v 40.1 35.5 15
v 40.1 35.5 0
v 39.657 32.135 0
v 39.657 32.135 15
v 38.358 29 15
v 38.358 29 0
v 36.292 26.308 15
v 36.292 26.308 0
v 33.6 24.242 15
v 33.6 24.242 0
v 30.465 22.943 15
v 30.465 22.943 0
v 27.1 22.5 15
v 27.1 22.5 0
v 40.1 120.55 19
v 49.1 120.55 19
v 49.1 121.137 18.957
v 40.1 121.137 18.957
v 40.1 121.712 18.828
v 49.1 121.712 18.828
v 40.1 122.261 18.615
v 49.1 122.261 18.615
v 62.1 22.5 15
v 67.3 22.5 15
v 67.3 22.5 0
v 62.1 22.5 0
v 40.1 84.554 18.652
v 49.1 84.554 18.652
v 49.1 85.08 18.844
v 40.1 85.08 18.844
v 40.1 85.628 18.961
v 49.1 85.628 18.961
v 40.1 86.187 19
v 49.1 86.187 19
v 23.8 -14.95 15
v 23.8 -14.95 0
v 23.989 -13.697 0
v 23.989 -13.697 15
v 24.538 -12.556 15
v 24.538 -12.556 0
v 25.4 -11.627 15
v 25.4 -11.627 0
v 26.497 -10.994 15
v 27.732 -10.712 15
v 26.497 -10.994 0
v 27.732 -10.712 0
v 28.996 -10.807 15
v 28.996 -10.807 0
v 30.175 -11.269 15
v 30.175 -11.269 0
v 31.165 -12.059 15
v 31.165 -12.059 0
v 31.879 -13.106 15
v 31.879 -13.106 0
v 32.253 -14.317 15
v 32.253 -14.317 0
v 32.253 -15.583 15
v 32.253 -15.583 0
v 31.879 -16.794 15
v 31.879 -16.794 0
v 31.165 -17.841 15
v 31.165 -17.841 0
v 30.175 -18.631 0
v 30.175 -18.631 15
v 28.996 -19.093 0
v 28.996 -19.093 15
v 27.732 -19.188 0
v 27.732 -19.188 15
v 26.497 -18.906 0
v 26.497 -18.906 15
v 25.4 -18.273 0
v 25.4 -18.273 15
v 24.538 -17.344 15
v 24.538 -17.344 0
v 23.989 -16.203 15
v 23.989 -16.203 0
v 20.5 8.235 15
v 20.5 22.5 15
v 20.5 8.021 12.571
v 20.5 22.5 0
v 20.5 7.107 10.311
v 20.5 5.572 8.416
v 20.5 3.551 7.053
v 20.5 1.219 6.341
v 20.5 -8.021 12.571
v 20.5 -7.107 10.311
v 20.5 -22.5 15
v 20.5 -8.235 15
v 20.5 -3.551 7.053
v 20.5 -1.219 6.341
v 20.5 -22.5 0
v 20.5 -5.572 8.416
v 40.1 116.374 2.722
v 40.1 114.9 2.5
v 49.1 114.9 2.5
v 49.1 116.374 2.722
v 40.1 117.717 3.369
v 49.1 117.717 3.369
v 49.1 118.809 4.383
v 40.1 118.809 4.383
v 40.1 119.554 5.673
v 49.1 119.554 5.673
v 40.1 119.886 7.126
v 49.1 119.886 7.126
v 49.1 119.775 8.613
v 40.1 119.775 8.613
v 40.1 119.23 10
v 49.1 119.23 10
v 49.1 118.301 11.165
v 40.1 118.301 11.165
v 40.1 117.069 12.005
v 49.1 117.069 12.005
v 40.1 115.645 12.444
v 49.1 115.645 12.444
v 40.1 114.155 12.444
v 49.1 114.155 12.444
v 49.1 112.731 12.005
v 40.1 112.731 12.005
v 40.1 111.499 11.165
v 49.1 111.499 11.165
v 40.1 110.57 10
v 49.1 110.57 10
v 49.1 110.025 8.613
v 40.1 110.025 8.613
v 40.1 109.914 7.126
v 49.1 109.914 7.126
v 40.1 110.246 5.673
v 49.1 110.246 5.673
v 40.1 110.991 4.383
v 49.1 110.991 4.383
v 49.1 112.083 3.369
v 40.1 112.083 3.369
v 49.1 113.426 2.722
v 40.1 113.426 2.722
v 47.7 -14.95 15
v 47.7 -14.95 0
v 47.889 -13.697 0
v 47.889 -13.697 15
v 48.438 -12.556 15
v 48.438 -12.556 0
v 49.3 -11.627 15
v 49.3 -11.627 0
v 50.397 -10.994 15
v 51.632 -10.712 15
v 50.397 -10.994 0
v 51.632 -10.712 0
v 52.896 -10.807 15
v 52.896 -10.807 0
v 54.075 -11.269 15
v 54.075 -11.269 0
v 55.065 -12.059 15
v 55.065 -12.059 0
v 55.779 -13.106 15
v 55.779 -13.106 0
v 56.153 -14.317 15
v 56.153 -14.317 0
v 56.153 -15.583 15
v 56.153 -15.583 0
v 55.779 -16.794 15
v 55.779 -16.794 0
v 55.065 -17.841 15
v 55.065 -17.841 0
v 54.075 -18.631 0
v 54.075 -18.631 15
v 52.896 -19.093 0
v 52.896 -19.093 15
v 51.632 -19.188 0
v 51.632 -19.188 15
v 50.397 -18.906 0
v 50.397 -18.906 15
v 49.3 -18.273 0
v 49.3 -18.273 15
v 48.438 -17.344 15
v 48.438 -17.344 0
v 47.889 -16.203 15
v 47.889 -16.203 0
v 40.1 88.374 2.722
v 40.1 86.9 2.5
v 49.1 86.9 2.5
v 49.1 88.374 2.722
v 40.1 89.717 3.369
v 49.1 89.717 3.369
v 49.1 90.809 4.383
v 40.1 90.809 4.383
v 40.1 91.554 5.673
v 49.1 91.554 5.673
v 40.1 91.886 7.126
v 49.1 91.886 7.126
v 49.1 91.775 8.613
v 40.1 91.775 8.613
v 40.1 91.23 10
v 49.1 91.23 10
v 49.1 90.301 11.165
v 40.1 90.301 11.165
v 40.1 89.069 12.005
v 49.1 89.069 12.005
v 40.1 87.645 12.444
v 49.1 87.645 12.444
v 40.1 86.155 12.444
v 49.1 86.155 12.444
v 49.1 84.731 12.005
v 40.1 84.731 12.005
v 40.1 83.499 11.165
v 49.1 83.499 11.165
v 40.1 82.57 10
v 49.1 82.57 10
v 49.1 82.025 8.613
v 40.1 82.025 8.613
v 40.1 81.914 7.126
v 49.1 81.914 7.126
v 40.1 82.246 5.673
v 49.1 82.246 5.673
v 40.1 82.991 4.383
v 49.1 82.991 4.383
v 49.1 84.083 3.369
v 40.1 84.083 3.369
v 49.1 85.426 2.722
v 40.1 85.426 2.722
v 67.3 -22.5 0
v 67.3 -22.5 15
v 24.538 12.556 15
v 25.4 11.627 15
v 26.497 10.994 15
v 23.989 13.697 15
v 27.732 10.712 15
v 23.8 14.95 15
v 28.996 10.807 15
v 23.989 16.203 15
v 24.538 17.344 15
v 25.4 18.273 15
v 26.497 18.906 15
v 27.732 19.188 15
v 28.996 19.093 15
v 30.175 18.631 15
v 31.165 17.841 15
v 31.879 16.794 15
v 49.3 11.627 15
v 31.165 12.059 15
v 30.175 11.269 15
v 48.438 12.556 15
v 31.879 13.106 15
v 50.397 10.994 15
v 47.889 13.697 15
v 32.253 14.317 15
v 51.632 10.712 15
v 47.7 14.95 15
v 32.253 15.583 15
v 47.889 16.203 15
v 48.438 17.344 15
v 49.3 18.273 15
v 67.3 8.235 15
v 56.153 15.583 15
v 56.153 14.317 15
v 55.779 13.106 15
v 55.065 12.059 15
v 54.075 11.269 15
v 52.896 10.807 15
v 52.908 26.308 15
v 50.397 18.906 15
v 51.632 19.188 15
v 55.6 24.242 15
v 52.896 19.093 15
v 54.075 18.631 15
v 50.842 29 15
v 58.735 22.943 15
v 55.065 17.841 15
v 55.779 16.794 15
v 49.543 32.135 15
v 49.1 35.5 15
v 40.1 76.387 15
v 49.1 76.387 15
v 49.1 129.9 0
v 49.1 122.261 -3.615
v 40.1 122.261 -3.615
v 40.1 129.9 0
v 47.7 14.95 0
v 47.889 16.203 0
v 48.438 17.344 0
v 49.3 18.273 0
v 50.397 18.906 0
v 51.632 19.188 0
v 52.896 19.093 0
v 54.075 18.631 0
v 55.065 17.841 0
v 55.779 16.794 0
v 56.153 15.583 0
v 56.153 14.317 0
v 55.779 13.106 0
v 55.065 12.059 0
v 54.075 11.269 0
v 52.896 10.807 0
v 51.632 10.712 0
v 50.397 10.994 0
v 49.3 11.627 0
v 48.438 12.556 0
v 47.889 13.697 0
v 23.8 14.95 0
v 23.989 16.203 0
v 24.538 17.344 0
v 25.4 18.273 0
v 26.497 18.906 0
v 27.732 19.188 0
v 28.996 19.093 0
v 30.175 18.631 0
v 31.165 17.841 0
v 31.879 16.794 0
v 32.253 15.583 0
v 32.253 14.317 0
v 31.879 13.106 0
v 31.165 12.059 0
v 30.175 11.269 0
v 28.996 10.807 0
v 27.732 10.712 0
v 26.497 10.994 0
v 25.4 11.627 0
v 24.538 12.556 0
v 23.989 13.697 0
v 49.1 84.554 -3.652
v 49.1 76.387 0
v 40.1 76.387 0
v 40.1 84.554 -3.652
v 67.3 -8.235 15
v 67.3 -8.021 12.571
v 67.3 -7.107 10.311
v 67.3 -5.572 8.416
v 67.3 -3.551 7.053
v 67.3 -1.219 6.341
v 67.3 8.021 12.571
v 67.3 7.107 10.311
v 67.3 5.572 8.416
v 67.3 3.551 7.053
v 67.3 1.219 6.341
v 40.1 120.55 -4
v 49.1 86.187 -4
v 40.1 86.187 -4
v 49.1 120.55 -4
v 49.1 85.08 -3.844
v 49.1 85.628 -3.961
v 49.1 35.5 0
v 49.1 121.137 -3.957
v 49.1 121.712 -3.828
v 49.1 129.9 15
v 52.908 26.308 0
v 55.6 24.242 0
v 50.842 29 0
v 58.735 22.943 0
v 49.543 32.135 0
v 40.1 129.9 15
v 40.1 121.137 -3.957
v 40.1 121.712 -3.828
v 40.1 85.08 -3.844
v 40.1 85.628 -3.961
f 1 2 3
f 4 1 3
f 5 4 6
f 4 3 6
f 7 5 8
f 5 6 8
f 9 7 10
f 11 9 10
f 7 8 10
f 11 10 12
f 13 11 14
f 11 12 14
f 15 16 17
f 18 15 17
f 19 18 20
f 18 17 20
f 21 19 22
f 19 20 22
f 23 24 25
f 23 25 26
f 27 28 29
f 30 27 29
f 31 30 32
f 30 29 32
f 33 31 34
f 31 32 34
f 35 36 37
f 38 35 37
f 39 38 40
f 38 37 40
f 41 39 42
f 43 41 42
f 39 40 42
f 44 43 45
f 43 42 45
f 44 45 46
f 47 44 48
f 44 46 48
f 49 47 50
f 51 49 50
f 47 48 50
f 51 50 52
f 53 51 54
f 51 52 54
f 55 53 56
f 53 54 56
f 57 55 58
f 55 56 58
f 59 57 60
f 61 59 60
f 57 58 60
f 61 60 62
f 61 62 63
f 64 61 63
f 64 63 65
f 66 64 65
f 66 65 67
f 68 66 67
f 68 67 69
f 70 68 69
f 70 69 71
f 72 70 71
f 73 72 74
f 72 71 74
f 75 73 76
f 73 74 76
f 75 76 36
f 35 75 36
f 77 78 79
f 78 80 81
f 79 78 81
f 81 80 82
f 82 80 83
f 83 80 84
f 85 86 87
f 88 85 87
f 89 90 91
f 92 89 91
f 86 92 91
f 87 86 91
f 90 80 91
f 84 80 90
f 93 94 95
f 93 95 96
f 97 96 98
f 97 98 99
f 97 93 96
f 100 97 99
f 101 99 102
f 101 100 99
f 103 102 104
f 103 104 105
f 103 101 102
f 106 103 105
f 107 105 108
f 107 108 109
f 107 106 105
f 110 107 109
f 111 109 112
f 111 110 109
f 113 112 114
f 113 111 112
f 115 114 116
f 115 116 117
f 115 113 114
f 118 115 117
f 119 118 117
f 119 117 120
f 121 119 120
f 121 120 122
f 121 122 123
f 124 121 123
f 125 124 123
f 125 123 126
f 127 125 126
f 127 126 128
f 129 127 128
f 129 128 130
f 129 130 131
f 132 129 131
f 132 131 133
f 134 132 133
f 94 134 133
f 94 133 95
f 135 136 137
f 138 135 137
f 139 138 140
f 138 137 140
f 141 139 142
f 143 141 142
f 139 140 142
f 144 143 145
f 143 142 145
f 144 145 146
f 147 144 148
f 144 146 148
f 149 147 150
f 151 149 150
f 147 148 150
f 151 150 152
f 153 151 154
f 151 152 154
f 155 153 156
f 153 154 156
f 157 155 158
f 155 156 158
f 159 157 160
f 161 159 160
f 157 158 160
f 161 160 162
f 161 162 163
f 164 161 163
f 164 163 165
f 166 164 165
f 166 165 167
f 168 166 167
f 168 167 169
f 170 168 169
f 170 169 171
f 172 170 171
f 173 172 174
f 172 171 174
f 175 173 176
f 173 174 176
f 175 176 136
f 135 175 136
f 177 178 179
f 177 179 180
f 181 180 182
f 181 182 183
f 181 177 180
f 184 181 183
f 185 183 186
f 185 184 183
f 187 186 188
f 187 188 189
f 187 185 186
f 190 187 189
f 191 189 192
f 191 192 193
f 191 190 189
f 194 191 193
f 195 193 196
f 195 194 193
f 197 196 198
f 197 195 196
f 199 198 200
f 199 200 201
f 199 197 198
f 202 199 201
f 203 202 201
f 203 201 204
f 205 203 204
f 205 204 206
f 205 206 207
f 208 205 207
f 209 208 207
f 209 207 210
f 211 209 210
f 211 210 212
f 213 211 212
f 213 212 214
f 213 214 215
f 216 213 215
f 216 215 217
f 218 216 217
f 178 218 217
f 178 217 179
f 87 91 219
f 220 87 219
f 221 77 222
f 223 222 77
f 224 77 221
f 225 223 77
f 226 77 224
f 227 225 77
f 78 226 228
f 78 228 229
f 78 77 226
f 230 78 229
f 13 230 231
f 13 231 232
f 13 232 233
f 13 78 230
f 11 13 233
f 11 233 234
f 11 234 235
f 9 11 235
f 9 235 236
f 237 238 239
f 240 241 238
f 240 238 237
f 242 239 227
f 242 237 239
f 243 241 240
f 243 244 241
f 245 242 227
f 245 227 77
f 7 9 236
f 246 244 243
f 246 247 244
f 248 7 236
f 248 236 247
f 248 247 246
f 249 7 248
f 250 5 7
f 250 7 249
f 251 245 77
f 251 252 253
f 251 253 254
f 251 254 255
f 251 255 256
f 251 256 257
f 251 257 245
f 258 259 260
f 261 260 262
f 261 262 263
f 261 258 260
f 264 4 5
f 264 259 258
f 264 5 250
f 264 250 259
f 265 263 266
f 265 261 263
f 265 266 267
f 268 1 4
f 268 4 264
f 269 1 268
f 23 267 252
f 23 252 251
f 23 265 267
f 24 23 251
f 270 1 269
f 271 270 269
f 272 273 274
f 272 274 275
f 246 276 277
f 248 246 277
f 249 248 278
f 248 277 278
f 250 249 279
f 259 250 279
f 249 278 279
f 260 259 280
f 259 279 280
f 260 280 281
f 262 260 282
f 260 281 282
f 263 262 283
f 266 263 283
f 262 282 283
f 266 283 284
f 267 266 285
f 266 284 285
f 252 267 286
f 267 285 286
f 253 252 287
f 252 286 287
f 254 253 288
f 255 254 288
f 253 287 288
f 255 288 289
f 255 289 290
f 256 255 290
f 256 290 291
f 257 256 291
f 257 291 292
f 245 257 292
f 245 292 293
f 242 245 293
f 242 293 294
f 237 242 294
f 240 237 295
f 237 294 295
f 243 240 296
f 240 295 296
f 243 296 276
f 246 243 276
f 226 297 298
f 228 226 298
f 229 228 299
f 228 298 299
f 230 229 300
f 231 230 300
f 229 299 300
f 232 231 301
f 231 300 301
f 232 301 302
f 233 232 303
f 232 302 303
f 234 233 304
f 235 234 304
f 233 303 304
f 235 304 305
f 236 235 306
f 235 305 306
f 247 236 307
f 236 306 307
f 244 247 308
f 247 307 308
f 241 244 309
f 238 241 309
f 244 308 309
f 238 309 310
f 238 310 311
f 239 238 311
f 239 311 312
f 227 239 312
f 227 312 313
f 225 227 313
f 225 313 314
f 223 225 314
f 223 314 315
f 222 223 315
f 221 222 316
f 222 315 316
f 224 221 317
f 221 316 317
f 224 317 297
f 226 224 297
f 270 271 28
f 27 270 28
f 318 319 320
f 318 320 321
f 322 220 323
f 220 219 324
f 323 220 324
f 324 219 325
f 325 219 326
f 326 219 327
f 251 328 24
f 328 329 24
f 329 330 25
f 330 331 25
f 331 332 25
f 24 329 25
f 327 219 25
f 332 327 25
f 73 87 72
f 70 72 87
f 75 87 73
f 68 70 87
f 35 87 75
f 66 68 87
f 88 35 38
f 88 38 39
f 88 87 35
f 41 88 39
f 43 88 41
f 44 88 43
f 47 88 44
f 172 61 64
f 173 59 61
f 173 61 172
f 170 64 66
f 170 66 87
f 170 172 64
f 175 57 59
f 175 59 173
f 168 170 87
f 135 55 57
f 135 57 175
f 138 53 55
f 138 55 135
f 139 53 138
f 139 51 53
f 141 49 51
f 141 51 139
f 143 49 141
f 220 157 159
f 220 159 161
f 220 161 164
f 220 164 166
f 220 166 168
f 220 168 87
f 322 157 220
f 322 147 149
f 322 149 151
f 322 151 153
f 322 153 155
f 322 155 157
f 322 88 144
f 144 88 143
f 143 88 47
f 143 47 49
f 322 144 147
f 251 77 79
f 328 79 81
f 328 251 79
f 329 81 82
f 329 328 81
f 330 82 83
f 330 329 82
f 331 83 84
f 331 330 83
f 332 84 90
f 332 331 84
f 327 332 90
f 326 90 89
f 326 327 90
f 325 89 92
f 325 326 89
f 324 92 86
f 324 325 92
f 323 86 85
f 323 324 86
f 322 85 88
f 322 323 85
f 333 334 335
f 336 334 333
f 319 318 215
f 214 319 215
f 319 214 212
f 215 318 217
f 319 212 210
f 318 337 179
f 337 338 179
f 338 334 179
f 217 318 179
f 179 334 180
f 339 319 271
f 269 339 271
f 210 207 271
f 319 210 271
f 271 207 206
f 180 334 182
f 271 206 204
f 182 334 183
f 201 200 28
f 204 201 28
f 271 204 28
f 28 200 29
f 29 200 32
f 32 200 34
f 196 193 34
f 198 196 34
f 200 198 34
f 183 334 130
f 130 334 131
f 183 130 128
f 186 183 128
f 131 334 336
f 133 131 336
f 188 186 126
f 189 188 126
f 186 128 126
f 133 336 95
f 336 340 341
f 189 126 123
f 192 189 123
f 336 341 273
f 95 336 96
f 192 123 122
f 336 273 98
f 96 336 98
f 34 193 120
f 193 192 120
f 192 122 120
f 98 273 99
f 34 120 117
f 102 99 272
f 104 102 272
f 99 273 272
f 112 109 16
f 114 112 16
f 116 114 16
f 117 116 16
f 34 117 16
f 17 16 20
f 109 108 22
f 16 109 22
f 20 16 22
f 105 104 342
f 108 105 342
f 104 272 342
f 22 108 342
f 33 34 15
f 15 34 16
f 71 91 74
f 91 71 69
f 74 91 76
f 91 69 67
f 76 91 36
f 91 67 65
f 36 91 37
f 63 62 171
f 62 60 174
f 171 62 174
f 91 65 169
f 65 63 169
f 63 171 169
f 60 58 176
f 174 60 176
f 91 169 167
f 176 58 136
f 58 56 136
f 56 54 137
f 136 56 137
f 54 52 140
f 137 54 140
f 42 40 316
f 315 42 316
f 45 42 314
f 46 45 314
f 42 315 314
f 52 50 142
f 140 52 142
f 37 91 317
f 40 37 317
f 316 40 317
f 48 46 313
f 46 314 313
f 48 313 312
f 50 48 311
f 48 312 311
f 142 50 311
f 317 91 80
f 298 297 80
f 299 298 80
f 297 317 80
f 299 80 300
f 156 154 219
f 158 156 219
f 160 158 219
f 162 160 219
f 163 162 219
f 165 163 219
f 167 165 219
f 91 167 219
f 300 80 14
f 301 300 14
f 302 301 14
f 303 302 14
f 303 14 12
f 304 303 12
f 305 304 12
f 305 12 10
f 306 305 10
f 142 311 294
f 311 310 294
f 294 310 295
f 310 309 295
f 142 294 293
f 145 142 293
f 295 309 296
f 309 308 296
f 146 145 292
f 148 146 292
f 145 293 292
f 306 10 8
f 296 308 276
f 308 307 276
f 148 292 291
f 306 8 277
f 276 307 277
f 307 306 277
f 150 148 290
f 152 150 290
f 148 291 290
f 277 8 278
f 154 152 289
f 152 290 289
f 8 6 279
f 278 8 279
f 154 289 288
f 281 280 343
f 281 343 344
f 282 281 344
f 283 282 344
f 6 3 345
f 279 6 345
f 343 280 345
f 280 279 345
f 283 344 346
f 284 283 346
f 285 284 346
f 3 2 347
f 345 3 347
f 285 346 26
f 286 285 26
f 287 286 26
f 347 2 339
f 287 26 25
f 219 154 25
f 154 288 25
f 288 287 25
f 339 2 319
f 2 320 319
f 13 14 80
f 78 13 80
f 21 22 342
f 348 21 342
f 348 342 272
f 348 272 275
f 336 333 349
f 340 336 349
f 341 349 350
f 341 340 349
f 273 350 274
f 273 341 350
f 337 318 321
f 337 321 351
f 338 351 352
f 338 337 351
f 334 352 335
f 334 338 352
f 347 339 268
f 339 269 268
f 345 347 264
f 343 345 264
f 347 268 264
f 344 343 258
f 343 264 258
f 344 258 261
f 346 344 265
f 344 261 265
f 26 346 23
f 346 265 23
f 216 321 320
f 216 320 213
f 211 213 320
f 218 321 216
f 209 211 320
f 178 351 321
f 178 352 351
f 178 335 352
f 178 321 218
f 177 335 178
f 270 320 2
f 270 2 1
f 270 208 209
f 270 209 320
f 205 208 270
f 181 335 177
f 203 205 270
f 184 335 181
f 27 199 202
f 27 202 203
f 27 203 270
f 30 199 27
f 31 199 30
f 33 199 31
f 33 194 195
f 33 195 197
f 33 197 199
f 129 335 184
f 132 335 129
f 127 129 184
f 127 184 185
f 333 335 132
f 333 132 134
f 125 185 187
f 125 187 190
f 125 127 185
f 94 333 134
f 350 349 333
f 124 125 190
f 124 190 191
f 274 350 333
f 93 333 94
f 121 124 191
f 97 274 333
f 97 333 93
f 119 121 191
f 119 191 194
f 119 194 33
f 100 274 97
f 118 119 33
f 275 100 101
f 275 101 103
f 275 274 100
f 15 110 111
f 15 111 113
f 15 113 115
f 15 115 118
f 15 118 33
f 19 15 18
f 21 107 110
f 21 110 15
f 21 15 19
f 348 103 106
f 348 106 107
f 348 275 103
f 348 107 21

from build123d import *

# Parameters (mm, degrees)
SKETCH1_R           = 4.25
BOSS_EXTRUDE1_DEPTH = 15
SKETCH3_R           = 8.25
CUT_EXTRUDE1_DEPTH  = 55.05
SKETCH4_R           = 5
CUT_EXTRUDE3_DEPTH  = 46.05
BOSS_EXTRUDE2_DEPTH = 9
FILLET1_R           = 13


with BuildPart() as part:
    # Sketch1 → Boss-Extrude1 (new body)
    with BuildSketch(Plane.XY):
        with BuildLine():
            Line((-8.1, 22.5), (-8.1, 129.9))
            Line((-8.1, 129.9), (0.9, 129.9))
            Line((0.9, 129.9), (0.9, 35.5))
            ThreePointArc((0.9, 35.5), (4.707611845, 26.307611845), (13.9, 22.5))
            Line((13.9, 22.5), (20.5, 22.5))
            Line((20.5, 22.5), (20.5, -22.5))
            Line((20.5, -22.5), (-26.3, -22.5))
            Line((-26.3, -22.5), (-26.3, 22.5))
            Line((-26.3, 22.5), (-8.1, 22.5))
        make_face()
        with Locations((-10.95, -14.95)):
            Circle(SKETCH1_R, mode=Mode.SUBTRACT)
        with Locations((12.95, -14.95)):
            Circle(SKETCH1_R, mode=Mode.SUBTRACT)
        with Locations((12.95, 14.95)):
            Circle(SKETCH1_R, mode=Mode.SUBTRACT)
        with Locations((-10.95, 14.95)):
            Circle(SKETCH1_R, mode=Mode.SUBTRACT)
    extrude(amount=BOSS_EXTRUDE1_DEPTH)

    # Sketch3 → Cut-Extrude1 (cut)
    with BuildSketch(Plane.ZY.offset(26.3)):
        with Locations((14.5, 0)):
            Circle(SKETCH3_R)
    extrude(amount=-CUT_EXTRUDE1_DEPTH, mode=Mode.SUBTRACT)

    # Sketch4 → Cut-Extrude3 (cut)
    with BuildSketch(Plane(origin=(0.9, 0, 0), x_dir=(0, 0, -1), z_dir=(1, 0, 0))):
        with Locations((-7.5, 86.9)):
            Circle(SKETCH4_R)
        with Locations((-7.5, 114.9)):
            Circle(SKETCH4_R)
    extrude(amount=-CUT_EXTRUDE3_DEPTH, mode=Mode.SUBTRACT)

    # Sketch6 → Boss-Extrude2 (add)
    with BuildSketch(Plane.ZY.offset(8.1)):
        with BuildLine():
            Line((15, 76.386851455), (18.651630299, 84.554112306))
            ThreePointArc((18.651630299, 84.554112306), (18.911938215, 85.352068488), (19, 86.186777661))
            Line((19, 86.186777661), (19, 120.550049196))
            ThreePointArc((19, 120.550049196), (18.902685036, 121.427003874), (18.615475246, 122.261288146))
            Line((18.615475246, 122.261288146), (15, 129.9))
            Line((15, 129.9), (15, 76.386851455))
        make_face()
        with BuildLine():
            Line((-3.615475246, 122.261288146), (0, 129.9))
            Line((0, 129.9), (0, 76.386851455))
            Line((0, 76.386851455), (-3.651630299, 84.554112306))
            ThreePointArc((-3.651630299, 84.554112306), (-3.911938215, 85.352068488), (-4, 86.186777661))
            Line((-4, 86.186777661), (-4, 120.550049196))
            ThreePointArc((-4, 120.550049196), (-3.902685036, 121.427003874), (-3.615475246, 122.261288146))
        make_face()
    extrude(amount=-BOSS_EXTRUDE2_DEPTH)

    # Fillet1
    fillet1_edges = [part.edges().sort_by_distance(p)[0] for p in [
        (-8.1, 22.5, 7.5),
    ]]
    fillet(fillet1_edges, radius=FILLET1_R)


with BuildPart() as body_2:
    # Mirror2: mirrored copy
    add(part.part.mirror(Plane(origin=(20.5, -22.5, 15), x_dir=(0, 0, 1), z_dir=(-1, 0, 0))))


solid = body_2.part
